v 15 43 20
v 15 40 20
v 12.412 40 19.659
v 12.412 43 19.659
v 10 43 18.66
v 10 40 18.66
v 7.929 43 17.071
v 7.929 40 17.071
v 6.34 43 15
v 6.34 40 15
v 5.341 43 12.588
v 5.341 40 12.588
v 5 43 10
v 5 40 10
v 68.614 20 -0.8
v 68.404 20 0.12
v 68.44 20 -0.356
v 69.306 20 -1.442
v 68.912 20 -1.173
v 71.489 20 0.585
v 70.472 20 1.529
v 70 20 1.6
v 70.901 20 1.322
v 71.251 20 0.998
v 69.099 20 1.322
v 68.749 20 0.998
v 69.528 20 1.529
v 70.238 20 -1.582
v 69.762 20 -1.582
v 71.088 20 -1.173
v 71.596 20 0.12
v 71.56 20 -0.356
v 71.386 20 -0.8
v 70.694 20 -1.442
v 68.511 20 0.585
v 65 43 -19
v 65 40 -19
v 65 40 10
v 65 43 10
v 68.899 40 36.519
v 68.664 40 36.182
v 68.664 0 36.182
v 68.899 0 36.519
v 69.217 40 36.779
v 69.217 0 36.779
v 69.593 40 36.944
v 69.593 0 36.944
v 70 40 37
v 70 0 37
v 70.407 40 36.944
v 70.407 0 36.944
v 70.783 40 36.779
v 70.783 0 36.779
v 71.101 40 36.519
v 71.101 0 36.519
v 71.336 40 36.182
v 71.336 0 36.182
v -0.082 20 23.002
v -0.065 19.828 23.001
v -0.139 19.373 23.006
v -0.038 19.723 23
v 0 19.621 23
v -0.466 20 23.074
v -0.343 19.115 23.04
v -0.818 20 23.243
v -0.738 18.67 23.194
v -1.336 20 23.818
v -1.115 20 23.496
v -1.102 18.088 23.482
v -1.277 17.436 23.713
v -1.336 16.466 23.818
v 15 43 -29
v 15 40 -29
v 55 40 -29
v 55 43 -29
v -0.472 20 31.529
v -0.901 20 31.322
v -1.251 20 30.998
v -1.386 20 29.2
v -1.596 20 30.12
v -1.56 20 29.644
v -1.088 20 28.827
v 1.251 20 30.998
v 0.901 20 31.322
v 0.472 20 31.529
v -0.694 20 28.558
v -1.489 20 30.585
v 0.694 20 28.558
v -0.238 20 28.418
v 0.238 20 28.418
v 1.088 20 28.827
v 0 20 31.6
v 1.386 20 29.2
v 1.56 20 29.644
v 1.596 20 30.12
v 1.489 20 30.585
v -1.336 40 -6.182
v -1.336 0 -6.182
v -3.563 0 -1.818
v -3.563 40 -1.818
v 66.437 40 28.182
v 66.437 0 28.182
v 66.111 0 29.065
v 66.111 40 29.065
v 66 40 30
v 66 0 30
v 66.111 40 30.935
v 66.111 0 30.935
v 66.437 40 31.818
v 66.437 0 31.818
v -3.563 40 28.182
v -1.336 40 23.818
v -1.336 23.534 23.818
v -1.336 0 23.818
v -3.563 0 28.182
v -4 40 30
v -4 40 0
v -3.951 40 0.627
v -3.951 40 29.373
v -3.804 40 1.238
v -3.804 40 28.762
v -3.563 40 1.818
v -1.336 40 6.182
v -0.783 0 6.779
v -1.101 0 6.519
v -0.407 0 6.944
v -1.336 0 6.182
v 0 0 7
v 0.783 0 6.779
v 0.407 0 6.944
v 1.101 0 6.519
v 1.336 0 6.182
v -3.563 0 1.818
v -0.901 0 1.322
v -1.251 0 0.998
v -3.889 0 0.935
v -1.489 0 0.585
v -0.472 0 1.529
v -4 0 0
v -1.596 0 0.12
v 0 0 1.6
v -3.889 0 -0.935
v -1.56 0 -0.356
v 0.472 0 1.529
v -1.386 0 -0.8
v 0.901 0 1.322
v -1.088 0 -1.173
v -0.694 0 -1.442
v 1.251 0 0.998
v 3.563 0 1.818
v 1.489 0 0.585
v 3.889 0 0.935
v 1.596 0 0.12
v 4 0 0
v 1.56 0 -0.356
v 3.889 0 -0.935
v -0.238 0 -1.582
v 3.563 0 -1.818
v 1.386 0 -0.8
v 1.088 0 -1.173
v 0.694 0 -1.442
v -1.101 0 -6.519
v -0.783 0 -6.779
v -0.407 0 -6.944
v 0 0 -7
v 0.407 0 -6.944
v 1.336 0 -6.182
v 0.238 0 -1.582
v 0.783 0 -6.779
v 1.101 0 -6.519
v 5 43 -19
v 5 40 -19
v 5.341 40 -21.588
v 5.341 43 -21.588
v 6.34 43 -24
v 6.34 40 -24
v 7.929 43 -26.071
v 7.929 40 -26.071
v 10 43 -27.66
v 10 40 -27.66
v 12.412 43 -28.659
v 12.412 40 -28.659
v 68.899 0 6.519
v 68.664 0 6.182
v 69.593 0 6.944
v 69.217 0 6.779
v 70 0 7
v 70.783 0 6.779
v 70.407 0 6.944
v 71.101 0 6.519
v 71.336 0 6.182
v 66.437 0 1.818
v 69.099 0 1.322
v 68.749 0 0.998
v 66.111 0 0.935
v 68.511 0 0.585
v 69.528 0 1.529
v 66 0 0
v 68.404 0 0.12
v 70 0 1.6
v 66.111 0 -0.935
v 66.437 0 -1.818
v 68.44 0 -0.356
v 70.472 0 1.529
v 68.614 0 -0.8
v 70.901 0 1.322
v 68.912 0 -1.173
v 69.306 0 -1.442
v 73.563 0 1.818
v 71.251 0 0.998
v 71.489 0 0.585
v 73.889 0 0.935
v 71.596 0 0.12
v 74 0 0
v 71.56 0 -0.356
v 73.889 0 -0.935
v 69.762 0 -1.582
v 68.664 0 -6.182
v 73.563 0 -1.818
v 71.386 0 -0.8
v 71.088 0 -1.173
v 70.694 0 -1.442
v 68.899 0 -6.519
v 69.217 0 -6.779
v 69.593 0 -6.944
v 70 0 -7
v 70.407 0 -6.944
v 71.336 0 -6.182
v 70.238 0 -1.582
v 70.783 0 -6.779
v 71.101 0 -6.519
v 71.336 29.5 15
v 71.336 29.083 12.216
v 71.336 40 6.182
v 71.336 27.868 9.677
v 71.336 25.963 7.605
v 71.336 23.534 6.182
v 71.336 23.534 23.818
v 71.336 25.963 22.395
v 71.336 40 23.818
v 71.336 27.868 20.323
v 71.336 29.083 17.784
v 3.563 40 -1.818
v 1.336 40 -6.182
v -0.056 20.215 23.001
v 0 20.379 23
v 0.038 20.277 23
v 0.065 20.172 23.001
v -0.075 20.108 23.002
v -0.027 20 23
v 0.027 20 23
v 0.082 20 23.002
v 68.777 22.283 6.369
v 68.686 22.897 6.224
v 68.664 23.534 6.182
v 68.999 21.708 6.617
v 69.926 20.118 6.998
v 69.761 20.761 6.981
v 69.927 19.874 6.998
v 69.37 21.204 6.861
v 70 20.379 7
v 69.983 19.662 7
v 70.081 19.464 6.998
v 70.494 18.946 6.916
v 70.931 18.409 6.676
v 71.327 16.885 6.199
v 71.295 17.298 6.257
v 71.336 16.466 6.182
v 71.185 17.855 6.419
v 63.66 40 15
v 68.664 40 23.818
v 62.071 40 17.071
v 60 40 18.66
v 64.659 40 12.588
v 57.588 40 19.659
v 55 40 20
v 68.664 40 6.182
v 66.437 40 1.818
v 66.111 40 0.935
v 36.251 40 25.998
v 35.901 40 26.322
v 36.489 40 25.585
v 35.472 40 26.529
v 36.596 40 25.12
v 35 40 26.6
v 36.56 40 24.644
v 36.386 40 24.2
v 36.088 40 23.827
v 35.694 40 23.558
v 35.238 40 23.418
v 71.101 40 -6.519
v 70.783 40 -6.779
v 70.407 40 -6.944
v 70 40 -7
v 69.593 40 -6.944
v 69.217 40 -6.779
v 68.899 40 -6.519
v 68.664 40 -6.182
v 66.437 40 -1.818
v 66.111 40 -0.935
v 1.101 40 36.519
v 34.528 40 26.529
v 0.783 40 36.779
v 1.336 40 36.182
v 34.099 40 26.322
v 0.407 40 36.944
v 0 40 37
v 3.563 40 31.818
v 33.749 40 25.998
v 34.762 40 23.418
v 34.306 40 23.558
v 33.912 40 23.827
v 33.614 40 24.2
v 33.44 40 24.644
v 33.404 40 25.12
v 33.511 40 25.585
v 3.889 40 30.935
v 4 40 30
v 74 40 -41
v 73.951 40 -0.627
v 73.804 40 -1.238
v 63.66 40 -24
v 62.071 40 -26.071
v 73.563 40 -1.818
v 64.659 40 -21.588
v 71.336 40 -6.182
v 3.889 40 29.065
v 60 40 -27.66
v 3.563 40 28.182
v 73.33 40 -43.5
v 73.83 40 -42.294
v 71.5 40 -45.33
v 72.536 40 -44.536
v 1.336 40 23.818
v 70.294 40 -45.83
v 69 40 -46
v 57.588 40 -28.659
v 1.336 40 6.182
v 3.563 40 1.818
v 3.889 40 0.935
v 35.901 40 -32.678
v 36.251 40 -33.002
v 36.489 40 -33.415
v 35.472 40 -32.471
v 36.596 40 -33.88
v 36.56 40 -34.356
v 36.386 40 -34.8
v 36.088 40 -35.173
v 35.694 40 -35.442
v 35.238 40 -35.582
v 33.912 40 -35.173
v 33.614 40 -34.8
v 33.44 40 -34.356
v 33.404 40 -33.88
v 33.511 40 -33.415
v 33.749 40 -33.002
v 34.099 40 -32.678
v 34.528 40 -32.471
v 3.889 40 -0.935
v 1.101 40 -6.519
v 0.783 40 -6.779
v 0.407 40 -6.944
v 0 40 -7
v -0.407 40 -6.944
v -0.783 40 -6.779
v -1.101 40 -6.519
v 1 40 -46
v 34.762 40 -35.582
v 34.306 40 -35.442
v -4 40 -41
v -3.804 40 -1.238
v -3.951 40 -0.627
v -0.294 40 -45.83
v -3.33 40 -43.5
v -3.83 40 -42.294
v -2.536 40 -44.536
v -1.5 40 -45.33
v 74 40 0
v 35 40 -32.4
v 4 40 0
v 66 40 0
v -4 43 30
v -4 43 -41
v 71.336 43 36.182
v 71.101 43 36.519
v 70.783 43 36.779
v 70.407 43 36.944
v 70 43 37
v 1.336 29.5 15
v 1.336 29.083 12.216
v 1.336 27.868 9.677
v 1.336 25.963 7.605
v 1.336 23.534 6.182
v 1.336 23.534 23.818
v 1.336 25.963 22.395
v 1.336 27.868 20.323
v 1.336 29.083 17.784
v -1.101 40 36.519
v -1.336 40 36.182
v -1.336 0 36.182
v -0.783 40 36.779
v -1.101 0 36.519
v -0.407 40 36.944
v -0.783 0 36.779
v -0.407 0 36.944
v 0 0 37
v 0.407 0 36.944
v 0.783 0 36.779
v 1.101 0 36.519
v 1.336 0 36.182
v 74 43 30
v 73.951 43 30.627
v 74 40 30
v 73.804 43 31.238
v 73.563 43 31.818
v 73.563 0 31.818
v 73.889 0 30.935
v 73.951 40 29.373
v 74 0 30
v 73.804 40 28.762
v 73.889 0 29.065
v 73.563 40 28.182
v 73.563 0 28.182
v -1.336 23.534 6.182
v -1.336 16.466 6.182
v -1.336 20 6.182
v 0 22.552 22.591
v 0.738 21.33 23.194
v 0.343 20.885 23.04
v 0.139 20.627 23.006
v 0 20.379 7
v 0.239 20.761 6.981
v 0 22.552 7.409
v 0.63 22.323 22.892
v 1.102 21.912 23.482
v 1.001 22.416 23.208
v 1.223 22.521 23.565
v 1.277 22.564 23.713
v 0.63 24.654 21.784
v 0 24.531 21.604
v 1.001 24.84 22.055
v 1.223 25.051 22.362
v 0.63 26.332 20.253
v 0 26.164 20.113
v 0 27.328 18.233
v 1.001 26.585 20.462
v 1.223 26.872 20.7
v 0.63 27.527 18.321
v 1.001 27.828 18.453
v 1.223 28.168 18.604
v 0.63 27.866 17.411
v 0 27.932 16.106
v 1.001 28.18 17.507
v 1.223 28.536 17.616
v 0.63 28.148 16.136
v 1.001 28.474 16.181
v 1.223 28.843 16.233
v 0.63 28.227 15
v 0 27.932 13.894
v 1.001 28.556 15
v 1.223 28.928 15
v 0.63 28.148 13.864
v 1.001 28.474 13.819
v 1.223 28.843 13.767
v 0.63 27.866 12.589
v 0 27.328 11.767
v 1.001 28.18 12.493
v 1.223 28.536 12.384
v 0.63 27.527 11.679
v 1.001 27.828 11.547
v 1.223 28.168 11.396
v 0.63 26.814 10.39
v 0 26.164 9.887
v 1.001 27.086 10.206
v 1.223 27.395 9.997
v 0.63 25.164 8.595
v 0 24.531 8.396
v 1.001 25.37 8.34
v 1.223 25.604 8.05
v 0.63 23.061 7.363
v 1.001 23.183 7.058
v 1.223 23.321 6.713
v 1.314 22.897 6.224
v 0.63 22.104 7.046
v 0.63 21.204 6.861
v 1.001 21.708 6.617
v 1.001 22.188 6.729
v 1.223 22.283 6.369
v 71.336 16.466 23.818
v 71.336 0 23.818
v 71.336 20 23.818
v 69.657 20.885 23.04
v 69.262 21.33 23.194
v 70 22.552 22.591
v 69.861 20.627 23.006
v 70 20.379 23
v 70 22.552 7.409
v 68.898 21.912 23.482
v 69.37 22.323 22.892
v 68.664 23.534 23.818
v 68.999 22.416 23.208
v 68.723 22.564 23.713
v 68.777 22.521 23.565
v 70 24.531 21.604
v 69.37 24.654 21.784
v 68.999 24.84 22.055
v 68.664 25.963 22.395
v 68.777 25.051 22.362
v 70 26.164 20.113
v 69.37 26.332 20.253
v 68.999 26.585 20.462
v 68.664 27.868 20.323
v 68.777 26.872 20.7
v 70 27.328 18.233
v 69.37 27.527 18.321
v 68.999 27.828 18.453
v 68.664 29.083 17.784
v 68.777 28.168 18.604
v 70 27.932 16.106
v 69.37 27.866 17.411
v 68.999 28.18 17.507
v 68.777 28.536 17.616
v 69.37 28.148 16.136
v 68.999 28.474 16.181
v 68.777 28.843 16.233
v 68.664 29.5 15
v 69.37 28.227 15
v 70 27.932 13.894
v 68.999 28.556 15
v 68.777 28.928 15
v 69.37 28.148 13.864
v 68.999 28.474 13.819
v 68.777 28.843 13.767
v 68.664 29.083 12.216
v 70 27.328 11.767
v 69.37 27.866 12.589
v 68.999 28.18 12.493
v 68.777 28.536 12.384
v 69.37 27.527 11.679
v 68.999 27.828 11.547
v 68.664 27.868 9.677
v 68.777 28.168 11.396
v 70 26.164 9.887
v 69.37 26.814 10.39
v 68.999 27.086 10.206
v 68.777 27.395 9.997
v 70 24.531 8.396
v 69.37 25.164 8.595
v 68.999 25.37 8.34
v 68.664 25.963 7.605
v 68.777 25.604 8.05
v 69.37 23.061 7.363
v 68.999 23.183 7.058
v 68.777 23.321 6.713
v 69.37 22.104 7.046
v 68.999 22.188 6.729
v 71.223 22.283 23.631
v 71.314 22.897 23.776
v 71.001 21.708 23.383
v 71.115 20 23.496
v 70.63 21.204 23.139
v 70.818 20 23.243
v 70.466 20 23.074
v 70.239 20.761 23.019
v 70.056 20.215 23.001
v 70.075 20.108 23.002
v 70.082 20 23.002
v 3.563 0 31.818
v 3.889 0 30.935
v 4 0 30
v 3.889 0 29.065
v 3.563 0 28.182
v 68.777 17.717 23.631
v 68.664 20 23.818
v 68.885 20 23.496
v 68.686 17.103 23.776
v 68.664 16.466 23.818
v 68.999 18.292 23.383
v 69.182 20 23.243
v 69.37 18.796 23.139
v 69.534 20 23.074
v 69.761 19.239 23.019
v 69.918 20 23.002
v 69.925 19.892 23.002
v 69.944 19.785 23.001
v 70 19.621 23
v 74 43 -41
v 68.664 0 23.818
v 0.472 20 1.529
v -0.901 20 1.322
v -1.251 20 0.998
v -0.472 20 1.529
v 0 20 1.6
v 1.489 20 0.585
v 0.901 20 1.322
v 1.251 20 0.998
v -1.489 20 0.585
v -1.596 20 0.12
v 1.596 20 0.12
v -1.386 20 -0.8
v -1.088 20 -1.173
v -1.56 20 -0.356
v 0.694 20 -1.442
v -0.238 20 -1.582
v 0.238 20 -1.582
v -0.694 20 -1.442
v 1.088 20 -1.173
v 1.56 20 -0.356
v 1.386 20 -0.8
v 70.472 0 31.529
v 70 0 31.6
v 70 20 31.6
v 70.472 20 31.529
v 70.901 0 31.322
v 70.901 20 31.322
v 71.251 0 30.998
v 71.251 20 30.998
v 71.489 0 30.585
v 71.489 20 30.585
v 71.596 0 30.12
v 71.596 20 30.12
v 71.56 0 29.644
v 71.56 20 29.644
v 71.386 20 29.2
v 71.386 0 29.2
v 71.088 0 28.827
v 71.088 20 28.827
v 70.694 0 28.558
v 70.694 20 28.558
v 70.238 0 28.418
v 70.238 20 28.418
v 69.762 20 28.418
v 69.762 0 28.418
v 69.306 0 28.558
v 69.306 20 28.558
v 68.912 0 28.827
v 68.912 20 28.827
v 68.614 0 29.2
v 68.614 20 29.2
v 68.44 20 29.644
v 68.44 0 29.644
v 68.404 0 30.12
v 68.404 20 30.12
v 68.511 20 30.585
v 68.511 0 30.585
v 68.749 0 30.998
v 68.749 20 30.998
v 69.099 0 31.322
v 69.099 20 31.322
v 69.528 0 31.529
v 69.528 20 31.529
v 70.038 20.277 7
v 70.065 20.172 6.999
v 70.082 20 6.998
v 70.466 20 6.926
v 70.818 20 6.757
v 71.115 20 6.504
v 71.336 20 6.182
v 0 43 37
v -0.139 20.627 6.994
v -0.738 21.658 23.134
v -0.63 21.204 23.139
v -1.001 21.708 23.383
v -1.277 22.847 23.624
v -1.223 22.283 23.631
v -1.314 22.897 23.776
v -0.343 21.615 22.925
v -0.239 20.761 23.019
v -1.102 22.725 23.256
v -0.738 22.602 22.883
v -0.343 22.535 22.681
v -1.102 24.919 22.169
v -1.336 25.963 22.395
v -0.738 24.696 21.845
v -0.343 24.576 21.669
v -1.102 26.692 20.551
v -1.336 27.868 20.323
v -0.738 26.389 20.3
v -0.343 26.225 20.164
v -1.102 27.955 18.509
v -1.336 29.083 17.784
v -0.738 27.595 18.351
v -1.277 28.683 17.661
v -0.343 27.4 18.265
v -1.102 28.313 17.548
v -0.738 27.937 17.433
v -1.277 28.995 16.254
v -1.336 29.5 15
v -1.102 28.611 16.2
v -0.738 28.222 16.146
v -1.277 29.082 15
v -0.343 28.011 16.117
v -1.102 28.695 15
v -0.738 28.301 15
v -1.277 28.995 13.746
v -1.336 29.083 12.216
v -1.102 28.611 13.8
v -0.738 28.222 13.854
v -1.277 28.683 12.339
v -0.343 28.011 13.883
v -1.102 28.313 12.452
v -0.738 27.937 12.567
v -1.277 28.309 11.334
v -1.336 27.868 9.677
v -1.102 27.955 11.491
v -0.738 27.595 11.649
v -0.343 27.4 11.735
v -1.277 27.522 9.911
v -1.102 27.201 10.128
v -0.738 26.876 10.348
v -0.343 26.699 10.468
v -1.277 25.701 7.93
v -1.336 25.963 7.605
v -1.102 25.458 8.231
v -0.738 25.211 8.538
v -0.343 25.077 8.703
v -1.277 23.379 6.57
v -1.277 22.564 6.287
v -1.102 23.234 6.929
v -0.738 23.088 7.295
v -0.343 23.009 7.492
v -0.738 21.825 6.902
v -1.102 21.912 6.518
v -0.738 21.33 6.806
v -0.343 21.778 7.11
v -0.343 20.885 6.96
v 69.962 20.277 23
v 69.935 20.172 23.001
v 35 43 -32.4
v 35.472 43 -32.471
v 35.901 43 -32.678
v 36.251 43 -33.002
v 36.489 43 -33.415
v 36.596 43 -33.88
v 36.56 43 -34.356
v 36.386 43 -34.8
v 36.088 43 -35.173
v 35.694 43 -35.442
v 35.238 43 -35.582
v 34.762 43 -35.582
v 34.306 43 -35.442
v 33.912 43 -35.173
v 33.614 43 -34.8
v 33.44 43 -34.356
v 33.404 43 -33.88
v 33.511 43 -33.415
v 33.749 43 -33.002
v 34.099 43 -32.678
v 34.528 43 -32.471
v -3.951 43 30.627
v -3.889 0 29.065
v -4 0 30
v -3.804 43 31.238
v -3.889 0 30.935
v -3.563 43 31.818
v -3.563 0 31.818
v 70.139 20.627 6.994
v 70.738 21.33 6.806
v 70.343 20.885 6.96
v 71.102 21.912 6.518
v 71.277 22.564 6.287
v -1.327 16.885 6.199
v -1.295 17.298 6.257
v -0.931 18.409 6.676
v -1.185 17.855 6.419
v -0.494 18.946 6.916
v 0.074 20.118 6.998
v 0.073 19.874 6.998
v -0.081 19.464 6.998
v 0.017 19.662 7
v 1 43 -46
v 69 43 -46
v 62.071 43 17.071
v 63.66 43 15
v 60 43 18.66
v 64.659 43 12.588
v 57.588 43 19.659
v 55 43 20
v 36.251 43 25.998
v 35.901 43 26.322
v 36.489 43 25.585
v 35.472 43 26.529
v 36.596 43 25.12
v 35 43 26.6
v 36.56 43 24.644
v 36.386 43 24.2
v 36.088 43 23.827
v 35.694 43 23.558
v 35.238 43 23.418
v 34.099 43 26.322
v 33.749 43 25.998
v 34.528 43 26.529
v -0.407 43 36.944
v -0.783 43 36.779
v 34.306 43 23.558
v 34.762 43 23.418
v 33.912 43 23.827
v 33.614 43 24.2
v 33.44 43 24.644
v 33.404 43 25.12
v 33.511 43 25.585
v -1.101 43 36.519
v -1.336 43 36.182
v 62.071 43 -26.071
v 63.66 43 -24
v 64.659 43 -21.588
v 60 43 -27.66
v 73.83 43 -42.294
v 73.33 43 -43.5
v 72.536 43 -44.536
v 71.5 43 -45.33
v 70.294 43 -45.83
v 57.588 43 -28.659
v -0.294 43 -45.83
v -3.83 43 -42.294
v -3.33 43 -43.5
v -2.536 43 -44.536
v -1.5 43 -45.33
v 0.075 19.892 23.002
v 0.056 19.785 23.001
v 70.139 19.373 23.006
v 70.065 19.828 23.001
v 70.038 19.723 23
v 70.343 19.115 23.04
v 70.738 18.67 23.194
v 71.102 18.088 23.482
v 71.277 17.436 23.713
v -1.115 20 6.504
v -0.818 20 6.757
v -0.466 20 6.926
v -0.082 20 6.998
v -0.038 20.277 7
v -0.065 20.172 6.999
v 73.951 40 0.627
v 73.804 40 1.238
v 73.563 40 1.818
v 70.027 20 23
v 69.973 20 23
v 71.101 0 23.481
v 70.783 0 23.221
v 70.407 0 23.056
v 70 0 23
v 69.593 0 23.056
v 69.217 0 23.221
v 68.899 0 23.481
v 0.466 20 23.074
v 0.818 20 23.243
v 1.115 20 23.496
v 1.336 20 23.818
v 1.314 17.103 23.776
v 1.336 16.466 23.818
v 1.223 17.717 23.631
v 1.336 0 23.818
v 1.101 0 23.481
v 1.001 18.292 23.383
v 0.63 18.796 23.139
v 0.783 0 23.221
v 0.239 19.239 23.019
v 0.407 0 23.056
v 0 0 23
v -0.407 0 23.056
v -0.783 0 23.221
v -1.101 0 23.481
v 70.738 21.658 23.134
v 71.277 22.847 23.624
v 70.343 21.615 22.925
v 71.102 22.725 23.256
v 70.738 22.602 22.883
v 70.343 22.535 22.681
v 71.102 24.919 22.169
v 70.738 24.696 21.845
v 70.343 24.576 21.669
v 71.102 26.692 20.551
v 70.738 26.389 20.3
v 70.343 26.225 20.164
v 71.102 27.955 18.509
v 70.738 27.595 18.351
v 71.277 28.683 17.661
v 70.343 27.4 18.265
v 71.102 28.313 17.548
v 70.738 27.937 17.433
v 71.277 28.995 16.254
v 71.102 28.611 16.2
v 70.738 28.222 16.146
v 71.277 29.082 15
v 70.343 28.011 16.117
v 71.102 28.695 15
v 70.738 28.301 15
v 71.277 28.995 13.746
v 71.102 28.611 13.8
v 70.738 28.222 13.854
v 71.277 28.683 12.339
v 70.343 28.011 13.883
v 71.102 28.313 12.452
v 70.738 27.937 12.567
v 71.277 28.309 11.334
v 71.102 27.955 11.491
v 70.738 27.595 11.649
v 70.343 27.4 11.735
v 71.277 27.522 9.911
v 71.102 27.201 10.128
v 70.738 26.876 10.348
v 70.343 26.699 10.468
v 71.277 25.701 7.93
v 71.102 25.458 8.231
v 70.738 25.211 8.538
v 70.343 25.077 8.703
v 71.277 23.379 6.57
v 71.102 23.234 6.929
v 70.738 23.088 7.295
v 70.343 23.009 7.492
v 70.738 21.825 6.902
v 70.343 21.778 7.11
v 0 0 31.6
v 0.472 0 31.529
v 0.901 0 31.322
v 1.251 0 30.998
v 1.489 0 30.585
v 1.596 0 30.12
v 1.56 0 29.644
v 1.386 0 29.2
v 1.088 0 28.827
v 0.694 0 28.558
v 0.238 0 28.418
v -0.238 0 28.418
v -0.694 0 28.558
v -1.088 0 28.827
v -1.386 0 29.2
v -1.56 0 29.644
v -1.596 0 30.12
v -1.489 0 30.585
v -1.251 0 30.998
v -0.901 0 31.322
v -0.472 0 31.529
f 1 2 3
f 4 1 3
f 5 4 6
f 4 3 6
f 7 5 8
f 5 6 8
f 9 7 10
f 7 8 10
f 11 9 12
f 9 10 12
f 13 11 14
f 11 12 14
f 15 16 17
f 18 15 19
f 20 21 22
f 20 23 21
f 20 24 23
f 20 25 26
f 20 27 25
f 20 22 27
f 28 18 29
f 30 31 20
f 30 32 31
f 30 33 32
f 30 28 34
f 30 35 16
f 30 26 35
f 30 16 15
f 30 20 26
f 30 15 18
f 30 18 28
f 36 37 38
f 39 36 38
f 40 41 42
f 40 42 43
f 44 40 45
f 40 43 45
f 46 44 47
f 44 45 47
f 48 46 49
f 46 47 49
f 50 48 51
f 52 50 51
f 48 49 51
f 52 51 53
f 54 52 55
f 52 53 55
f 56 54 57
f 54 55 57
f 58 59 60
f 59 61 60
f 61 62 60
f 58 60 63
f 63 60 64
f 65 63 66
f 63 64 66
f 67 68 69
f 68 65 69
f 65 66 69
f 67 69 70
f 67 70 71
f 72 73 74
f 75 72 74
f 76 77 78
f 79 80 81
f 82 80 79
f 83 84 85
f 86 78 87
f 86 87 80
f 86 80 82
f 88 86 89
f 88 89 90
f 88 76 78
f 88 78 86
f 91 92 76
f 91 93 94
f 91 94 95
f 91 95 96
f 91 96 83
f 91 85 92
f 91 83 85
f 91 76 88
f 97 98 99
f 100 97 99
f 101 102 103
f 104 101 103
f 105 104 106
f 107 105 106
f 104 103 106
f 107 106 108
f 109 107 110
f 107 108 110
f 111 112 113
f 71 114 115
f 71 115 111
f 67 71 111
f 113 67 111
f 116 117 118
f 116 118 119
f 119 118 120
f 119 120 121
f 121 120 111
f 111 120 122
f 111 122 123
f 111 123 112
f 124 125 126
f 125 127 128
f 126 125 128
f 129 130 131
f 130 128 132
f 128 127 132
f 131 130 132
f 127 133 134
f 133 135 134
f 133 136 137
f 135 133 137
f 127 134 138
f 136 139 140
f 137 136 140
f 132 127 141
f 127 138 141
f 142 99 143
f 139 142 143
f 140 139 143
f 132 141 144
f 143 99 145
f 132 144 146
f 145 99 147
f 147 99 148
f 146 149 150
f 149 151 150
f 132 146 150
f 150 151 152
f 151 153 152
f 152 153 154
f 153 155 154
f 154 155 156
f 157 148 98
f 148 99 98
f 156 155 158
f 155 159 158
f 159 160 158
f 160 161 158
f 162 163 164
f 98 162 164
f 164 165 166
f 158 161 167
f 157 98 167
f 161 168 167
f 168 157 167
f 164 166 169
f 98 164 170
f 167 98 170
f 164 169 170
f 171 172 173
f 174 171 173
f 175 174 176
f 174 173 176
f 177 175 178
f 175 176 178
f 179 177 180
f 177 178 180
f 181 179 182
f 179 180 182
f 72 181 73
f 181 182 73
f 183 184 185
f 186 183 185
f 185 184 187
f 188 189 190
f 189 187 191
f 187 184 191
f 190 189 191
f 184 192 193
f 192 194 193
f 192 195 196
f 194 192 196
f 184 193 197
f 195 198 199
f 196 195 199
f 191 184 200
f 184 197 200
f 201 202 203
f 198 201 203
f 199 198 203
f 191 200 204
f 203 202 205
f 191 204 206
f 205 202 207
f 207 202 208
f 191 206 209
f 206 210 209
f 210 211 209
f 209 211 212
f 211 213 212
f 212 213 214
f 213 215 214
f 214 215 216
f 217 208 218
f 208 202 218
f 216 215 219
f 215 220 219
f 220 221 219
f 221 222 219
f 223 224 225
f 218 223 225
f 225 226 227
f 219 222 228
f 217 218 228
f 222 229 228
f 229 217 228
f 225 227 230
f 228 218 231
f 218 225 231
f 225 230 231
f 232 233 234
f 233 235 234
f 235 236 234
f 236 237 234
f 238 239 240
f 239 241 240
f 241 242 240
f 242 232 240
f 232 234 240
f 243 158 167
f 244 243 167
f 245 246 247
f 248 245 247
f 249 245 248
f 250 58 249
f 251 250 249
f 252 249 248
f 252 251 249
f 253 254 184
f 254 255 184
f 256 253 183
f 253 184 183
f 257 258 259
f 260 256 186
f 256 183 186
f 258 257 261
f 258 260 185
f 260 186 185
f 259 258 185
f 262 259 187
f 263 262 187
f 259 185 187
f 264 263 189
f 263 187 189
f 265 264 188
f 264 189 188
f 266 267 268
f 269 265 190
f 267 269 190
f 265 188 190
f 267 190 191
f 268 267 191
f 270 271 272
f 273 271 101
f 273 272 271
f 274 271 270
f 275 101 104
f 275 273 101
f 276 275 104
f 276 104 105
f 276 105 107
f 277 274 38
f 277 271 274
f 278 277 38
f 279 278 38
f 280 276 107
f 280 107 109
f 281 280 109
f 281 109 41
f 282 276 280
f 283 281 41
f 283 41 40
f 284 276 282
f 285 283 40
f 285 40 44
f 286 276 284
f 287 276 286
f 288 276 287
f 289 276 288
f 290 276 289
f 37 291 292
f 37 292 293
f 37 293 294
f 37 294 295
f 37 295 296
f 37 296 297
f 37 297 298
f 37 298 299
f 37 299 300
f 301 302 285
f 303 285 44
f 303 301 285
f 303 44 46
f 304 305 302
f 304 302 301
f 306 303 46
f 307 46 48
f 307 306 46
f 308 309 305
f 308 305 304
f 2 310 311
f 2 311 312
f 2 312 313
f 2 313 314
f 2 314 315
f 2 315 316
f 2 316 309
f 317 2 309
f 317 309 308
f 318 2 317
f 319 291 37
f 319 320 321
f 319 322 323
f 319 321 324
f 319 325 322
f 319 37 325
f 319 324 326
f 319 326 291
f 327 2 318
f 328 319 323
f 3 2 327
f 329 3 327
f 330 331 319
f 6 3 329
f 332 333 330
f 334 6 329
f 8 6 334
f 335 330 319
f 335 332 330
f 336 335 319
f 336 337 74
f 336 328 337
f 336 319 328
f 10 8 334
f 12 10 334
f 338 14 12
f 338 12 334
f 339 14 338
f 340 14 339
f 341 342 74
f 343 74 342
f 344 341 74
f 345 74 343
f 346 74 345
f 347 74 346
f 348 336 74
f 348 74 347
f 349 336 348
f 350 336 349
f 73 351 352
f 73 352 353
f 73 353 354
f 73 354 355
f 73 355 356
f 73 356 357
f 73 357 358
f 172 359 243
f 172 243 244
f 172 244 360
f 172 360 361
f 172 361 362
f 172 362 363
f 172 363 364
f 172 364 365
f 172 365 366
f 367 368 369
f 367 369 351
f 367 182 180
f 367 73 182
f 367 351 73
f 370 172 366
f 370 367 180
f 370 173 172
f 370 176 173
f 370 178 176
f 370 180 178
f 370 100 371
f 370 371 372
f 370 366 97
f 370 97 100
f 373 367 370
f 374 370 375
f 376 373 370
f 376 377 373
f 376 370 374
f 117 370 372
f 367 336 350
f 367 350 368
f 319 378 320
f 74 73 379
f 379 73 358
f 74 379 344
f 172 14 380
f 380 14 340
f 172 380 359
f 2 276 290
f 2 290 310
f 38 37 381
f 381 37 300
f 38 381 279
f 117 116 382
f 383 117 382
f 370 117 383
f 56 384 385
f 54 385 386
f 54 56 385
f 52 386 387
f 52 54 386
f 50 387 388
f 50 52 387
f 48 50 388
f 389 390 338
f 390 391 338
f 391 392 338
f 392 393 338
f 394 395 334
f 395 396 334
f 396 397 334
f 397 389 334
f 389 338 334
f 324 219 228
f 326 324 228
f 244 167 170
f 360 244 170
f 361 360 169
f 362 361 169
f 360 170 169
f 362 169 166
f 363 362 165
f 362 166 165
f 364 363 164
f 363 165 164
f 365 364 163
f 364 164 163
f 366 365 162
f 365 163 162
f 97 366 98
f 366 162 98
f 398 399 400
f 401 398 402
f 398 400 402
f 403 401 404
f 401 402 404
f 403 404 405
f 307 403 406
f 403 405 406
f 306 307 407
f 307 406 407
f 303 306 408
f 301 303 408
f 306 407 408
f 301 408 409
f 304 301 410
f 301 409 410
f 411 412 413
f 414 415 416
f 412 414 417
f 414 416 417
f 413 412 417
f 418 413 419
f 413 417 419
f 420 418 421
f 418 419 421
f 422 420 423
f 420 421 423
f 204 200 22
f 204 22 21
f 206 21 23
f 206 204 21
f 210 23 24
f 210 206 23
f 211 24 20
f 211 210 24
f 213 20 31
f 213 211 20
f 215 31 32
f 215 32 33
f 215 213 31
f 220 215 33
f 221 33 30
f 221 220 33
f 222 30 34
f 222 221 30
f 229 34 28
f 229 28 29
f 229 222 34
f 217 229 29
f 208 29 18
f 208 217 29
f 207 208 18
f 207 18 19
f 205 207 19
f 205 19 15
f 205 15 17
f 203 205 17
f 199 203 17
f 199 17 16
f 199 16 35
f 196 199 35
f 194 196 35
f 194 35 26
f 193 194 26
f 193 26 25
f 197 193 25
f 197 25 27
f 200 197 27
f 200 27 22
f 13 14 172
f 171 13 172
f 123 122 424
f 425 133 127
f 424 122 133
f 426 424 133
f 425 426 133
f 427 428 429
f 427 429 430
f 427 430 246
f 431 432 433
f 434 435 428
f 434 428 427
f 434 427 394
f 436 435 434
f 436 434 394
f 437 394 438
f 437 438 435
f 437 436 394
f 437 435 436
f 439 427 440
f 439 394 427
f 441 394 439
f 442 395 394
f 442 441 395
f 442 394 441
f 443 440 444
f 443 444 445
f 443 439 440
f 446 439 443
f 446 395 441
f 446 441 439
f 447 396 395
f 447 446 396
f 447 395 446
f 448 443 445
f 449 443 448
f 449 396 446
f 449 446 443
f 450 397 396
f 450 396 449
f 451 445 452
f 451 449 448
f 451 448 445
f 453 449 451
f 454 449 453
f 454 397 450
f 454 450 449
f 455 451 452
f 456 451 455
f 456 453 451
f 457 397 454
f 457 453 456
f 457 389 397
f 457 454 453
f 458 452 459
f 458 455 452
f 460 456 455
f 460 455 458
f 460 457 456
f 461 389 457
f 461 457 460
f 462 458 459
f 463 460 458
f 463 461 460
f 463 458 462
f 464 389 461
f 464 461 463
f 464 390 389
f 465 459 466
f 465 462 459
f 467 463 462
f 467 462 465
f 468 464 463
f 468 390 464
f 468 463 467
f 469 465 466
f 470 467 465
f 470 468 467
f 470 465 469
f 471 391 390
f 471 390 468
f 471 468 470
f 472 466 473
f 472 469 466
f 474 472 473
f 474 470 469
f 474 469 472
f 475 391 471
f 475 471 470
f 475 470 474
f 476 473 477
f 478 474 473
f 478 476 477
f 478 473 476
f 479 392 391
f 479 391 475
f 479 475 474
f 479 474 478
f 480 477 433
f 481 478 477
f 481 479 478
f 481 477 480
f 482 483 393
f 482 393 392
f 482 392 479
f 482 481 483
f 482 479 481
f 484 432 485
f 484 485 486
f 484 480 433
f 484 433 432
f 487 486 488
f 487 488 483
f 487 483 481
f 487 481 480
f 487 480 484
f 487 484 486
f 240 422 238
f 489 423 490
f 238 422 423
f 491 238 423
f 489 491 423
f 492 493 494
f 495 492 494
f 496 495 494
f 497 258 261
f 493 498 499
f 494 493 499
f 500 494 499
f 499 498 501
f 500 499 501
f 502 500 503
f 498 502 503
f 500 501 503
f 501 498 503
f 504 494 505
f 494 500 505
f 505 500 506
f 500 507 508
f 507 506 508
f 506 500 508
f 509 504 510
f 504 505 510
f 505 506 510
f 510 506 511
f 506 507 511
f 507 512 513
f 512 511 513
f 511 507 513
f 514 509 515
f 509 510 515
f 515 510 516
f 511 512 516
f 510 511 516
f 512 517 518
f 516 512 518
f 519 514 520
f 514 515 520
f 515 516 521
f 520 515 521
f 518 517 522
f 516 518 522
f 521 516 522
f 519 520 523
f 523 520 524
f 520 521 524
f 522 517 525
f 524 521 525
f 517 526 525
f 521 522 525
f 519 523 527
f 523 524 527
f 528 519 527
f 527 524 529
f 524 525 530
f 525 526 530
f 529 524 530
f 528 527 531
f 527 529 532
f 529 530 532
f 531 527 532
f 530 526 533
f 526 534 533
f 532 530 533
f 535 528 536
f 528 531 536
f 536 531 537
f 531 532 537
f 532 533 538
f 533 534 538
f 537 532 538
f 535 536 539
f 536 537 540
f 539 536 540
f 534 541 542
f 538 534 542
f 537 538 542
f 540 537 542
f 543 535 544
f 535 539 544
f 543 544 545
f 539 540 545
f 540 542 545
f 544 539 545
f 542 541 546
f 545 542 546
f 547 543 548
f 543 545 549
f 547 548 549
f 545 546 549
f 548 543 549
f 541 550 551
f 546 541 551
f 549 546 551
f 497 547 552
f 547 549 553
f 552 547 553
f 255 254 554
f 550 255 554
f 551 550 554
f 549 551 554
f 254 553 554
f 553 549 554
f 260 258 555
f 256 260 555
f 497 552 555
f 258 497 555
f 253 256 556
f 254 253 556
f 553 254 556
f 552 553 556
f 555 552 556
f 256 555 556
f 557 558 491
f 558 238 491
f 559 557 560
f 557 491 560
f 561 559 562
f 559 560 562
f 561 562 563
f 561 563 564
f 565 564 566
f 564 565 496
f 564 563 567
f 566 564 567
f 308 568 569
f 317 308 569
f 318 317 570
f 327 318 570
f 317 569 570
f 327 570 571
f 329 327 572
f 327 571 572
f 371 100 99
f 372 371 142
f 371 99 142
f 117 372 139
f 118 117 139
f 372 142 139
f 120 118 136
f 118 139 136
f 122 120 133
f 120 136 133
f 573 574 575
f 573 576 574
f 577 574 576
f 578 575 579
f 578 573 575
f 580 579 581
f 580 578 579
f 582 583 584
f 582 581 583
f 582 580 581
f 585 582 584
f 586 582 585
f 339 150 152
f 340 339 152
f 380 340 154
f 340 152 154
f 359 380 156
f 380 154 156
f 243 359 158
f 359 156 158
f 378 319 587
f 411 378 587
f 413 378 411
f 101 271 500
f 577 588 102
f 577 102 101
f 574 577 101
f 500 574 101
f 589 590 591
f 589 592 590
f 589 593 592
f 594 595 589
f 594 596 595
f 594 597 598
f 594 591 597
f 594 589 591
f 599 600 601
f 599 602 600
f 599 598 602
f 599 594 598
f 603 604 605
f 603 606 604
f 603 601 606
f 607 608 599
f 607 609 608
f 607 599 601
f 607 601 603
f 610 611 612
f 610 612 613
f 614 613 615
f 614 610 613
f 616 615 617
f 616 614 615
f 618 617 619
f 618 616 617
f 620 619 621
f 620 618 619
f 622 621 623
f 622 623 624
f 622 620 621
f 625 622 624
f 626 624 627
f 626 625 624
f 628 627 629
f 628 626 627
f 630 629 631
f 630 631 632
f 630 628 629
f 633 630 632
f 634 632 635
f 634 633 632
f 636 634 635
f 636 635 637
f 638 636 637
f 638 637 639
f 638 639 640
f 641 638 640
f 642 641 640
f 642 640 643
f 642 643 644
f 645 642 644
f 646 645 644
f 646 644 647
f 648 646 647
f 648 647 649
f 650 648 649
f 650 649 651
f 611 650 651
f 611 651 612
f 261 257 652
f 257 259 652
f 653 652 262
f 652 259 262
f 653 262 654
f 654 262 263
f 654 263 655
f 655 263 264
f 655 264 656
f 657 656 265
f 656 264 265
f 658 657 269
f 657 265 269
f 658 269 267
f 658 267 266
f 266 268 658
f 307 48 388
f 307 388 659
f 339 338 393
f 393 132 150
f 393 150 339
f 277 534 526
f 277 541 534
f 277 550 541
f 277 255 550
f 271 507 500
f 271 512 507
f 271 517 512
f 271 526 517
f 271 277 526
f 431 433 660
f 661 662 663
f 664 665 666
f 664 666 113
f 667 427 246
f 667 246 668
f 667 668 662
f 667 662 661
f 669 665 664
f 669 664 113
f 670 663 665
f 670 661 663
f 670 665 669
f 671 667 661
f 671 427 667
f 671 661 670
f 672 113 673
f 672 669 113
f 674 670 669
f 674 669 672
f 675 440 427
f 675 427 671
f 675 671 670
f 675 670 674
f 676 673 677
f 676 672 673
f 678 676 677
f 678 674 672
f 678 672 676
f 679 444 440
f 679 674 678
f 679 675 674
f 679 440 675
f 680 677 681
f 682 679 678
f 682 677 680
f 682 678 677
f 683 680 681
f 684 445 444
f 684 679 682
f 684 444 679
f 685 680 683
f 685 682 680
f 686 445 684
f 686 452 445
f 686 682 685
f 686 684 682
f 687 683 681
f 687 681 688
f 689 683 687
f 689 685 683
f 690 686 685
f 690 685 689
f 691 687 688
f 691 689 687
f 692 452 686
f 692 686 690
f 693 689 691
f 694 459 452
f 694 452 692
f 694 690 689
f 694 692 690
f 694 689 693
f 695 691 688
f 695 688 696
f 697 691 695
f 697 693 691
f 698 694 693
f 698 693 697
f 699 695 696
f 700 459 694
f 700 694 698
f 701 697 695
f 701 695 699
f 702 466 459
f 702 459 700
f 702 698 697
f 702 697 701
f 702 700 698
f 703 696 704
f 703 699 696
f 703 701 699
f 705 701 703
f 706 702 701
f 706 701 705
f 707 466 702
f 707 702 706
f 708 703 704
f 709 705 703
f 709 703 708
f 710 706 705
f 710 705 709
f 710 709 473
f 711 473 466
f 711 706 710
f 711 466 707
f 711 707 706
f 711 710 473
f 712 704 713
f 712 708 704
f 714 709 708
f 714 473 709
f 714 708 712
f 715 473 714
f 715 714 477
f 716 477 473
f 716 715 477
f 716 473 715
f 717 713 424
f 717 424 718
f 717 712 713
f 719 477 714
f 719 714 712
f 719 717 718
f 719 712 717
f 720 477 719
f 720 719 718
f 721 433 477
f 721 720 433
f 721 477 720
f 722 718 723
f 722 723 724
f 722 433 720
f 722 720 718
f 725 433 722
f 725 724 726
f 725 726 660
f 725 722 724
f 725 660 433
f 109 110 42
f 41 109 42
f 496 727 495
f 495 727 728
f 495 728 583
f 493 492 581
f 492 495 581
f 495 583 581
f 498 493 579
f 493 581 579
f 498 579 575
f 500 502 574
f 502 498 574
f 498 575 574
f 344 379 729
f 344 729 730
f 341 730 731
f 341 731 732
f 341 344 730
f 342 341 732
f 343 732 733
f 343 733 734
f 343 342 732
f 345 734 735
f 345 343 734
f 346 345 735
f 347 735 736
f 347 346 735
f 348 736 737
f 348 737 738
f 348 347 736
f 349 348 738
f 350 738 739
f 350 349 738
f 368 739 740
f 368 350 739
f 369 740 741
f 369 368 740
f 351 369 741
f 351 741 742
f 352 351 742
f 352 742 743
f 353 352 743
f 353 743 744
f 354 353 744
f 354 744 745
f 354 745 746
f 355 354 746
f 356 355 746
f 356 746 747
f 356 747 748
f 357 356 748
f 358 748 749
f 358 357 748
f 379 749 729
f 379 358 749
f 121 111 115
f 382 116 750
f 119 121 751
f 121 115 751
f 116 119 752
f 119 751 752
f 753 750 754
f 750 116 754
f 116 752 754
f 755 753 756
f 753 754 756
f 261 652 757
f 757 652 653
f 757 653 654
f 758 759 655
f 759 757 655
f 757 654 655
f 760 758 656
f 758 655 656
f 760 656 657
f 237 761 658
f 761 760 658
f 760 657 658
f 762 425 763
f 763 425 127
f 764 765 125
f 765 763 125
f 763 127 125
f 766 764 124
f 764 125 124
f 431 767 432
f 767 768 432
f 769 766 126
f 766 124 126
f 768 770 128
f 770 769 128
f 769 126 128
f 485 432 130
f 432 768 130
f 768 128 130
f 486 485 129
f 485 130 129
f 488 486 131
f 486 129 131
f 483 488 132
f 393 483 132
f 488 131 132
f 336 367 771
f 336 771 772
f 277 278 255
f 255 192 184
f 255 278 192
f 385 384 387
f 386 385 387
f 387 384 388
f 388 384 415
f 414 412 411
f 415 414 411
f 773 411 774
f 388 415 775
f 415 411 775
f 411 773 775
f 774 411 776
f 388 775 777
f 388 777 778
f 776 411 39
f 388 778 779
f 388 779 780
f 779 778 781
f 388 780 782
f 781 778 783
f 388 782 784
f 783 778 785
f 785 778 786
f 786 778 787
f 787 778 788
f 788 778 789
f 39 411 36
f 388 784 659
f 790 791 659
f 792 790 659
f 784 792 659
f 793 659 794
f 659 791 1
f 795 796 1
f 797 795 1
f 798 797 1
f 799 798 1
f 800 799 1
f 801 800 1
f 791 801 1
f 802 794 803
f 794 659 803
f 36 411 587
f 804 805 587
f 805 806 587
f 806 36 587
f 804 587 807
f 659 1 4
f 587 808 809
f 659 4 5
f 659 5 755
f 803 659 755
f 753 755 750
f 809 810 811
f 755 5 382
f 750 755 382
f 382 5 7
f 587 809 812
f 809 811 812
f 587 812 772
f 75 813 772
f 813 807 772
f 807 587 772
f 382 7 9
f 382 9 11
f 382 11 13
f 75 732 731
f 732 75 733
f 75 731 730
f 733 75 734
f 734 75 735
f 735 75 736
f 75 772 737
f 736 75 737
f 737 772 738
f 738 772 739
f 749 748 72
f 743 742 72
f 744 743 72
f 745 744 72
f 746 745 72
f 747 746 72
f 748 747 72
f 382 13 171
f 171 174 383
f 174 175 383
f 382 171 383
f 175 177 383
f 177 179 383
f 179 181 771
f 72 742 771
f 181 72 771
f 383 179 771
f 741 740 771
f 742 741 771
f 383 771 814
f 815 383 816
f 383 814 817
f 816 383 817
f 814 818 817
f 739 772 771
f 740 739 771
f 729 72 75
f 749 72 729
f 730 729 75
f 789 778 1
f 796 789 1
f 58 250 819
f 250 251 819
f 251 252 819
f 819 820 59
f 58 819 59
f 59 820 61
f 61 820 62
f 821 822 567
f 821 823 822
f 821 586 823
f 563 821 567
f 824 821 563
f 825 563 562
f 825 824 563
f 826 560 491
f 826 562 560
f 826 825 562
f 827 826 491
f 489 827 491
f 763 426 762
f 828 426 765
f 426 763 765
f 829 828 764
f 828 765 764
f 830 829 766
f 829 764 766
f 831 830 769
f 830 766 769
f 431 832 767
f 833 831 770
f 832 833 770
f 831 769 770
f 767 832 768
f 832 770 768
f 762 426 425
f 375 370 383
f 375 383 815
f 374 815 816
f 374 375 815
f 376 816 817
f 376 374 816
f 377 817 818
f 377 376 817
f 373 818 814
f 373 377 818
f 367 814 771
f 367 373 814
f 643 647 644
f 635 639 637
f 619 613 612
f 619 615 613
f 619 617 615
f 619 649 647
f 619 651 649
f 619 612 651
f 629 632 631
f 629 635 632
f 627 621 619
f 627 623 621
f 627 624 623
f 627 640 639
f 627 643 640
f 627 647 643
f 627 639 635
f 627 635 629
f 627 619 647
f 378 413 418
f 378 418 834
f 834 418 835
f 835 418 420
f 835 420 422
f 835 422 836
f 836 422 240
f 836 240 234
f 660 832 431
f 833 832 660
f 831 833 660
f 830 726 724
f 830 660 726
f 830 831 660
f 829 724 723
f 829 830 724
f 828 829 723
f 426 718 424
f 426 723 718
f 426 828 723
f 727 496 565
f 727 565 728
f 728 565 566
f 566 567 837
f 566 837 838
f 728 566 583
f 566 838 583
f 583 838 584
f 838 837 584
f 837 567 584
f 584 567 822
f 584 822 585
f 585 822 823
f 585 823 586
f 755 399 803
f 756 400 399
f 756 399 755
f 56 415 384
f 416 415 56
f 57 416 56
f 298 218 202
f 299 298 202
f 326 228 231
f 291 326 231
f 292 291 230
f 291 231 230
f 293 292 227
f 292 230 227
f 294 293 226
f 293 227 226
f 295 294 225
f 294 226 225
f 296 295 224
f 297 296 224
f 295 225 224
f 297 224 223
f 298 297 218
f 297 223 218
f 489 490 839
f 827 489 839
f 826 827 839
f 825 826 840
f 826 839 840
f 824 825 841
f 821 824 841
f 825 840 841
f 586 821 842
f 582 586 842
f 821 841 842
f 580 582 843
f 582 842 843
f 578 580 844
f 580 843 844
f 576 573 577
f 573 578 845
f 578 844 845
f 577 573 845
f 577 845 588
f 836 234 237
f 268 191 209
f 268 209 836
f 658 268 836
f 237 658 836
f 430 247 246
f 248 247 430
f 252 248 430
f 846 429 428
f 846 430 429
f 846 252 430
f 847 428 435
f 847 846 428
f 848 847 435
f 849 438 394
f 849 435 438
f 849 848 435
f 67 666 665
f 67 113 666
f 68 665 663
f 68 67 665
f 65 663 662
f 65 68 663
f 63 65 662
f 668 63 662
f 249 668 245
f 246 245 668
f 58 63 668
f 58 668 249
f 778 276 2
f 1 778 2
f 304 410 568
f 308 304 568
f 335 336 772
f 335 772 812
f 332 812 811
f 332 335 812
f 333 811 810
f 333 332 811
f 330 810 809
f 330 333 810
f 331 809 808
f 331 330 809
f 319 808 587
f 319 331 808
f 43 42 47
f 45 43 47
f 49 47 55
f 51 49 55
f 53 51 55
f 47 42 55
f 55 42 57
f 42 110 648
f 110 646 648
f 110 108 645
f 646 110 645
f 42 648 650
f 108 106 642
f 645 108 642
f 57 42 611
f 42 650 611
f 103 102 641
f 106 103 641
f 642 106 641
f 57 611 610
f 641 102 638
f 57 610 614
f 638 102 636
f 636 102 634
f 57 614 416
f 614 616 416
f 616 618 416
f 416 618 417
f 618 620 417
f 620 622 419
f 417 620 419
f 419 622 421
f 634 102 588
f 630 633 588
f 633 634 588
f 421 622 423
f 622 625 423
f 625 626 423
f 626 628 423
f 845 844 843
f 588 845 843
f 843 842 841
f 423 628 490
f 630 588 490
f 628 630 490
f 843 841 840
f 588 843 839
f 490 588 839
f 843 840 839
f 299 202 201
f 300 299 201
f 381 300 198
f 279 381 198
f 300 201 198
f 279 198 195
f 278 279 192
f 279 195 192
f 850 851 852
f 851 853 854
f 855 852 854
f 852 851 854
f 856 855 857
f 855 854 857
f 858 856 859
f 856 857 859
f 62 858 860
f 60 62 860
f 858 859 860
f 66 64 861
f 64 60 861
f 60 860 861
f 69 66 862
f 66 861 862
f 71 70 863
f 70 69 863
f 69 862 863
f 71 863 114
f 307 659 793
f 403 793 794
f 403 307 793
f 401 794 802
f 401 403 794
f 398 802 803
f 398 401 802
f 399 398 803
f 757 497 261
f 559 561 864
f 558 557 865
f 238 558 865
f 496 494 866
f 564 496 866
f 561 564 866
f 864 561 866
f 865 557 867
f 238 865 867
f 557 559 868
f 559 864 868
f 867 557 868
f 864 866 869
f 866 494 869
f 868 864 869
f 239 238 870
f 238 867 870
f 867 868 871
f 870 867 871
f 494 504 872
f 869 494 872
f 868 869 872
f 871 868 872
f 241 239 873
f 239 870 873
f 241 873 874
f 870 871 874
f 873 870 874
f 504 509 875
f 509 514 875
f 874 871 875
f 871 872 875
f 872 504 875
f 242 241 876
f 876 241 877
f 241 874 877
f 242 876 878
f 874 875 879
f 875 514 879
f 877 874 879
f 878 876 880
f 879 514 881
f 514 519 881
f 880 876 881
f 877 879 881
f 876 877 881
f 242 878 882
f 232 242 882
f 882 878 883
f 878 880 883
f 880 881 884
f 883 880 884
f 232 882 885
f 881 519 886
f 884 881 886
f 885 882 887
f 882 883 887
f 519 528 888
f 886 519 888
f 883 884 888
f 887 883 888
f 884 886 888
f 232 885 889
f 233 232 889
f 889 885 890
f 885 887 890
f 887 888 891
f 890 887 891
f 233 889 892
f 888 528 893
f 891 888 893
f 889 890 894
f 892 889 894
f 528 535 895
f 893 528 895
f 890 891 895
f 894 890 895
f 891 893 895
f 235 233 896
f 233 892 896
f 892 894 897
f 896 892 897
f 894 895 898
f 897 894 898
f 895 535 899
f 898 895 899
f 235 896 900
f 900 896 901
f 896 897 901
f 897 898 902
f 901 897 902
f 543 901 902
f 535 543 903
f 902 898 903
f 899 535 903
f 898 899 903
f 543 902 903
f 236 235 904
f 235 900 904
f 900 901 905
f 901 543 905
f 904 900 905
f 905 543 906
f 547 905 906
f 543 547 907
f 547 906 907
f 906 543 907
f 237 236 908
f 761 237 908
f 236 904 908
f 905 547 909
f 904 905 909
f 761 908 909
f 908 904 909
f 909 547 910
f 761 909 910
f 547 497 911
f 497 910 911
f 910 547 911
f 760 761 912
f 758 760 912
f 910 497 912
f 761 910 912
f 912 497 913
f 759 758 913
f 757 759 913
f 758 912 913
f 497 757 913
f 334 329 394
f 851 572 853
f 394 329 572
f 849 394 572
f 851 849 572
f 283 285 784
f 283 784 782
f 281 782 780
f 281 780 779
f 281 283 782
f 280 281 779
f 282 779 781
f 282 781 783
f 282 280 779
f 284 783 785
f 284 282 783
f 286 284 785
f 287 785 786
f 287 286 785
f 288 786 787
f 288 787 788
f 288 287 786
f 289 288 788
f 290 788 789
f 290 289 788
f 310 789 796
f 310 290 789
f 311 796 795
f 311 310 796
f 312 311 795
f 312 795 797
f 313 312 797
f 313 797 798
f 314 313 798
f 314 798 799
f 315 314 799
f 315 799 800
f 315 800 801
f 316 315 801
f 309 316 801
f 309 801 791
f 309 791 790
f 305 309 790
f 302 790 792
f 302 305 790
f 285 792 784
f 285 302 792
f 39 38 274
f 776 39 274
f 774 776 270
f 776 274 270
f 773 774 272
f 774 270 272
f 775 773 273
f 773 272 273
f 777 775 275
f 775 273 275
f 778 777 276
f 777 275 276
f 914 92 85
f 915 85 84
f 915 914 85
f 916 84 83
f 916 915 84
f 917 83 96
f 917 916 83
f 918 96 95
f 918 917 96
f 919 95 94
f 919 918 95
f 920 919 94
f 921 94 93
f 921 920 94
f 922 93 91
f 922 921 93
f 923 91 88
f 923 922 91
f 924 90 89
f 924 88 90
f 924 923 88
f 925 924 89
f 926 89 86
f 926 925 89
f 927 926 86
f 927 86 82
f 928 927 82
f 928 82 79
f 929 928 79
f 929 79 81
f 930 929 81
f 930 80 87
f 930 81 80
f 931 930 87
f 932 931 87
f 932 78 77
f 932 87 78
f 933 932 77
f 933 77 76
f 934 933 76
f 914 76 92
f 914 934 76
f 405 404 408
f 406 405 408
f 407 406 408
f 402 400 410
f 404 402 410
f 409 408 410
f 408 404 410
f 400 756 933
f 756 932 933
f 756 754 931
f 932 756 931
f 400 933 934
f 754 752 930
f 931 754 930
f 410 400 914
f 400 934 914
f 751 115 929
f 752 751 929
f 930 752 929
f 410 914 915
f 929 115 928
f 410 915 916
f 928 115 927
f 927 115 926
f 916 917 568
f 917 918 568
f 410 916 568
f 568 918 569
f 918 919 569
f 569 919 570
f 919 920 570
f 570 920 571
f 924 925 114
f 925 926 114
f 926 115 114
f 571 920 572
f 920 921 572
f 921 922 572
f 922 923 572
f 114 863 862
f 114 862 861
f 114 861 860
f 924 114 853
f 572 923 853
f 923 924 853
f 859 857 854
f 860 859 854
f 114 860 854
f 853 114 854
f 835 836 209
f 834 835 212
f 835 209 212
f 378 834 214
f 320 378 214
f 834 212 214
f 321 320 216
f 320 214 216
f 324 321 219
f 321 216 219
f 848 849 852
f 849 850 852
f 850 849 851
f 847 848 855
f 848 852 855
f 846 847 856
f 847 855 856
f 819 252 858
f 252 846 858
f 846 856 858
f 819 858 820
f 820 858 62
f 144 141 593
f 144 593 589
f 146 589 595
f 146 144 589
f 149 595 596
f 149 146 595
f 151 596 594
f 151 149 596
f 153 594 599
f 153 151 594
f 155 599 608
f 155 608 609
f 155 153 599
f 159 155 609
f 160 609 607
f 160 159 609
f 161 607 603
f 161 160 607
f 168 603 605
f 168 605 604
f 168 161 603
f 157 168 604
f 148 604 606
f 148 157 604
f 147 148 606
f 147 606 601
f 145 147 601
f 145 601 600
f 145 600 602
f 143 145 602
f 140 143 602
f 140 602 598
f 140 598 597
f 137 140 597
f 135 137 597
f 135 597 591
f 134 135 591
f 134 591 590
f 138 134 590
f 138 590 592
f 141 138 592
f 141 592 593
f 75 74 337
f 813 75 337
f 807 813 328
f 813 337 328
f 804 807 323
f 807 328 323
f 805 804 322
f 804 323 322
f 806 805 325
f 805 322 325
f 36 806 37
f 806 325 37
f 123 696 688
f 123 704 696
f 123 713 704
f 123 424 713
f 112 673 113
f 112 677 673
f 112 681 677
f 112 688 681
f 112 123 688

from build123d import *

# Parameters (mm, degrees)
SKETCH1_R             = 1.6
BOSS_EXTRUDE1_DEPTH   = 40
BOSS_EXTRUDE1_2_DEPTH = 40
BOSS_EXTRUDE1_3_DEPTH = 40
BOSS_EXTRUDE1_4_DEPTH = 40
SKETCH2_R             = 1.6
BOSS_EXTRUDE2_DEPTH   = 3
SKETCH4_W             = 2.672170628
SKETCH4_H             = 17.636363636
BOSS_EXTRUDE3_DEPTH   = 20
SKETCH6_R             = 8
CUT_EXTRUDE2_DEPTH    = 99.18617902
FILLET1_R             = 1.5
BOSS_EXTRUDE4_START   = 20
SKETCH7_R             = 1.6
BOSS_EXTRUDE4_DEPTH   = 20


# Read off the part's stored shape, not the designer's step: Mirror2
with BuildPart() as part:
    # Sketch1 → Boss-Extrude1 (new body)
    with BuildSketch(Plane(origin=(0, 0, 0), x_dir=(1, 0, 0), z_dir=(0, 1, 0))):
        with BuildLine():
            Line((-1.336085314, 6.181818182), (-3.562894171, 1.818181818))
            ThreePointArc((-3.562894171, 1.818181818), (-4, 0), (-3.562894171, -1.818181818))
            Line((-3.562894171, -1.818181818), (-1.336085314, -6.181818182))
            ThreePointArc((-1.336085314, -6.181818182), (0, -7), (1.336085314, -6.181818182))
            Line((1.336085314, -6.181818182), (3.562894171, -1.818181818))
            ThreePointArc((3.562894171, -1.818181818), (4, 0), (3.562894171, 1.818181818))
            Line((3.562894171, 1.818181818), (1.336085314, 6.181818182))
            ThreePointArc((1.336085314, 6.181818182), (0, 7), (-1.336085314, 6.181818182))
        make_face()
        with Locations(Location((0, 0, 0), (0, 0, 270))):
            Circle(SKETCH1_R, mode=Mode.SUBTRACT)
    extrude(amount=BOSS_EXTRUDE1_DEPTH)



with BuildPart() as body_2:
    # Sketch1 → Boss-Extrude1 2 (new body)
    with BuildSketch(Plane(origin=(0, 0, 0), x_dir=(1, 0, 0), z_dir=(0, 1, 0))):
        with BuildLine():
            Line((68.663914686, 6.181818182), (66.437105829, 1.818181818))
            ThreePointArc((66.437105829, 1.818181818), (66, 0), (66.437105829, -1.818181818))
            Line((66.437105829, -1.818181818), (68.663914686, -6.181818182))
            ThreePointArc((68.663914686, -6.181818182), (70, -7), (71.336085314, -6.181818182))
            Line((71.336085314, -6.181818182), (73.562894171, -1.818181818))
            ThreePointArc((73.562894171, -1.818181818), (74, 0), (73.562894171, 1.818181818))
            Line((73.562894171, 1.818181818), (71.336085314, 6.181818182))
            ThreePointArc((71.336085314, 6.181818182), (70, 7), (68.663914686, 6.181818182))
        make_face()
        with Locations(Location((70, 0, 0), (0, 0, 270))):
            Circle(SKETCH1_R, mode=Mode.SUBTRACT)
    extrude(amount=BOSS_EXTRUDE1_2_DEPTH)


with BuildPart() as body_3:
    # Sketch1 → Boss-Extrude1 3 (new body)
    with BuildSketch(Plane(origin=(0, 0, 0), x_dir=(1, 0, 0), z_dir=(0, 1, 0))):
        with BuildLine():
            Line((68.663914686, -23.818181818), (66.437105829, -28.181818182))
            ThreePointArc((66.437105829, -28.181818182), (66, -30), (66.437105829, -31.818181818))
            Line((66.437105829, -31.818181818), (68.663914686, -36.181818182))
            ThreePointArc((68.663914686, -36.181818182), (70, -37), (71.336085314, -36.181818182))
            Line((71.336085314, -36.181818182), (73.562894171, -31.818181818))
            ThreePointArc((73.562894171, -31.818181818), (74, -30), (73.562894171, -28.181818182))
            Line((73.562894171, -28.181818182), (71.336085314, -23.818181818))
            ThreePointArc((71.336085314, -23.818181818), (70, -23), (68.663914686, -23.818181818))
        make_face()
        with Locations(Location((70, -30, 0), (0, 0, 270))):
            Circle(SKETCH1_R, mode=Mode.SUBTRACT)
    extrude(amount=BOSS_EXTRUDE1_3_DEPTH)


with BuildPart() as body_4:
    # Sketch1 → Boss-Extrude1 4 (new body)
    with BuildSketch(Plane(origin=(0, 0, 0), x_dir=(1, 0, 0), z_dir=(0, 1, 0))):
        with BuildLine():
            Line((-1.336085314, -23.818181818), (-3.562894171, -28.181818182))
            ThreePointArc((-3.562894171, -28.181818182), (-4, -30), (-3.562894171, -31.818181818))
            Line((-3.562894171, -31.818181818), (-1.336085314, -36.181818182))
            ThreePointArc((-1.336085314, -36.181818182), (0, -37), (1.336085314, -36.181818182))
            Line((1.336085314, -36.181818182), (3.562894171, -31.818181818))
            ThreePointArc((3.562894171, -31.818181818), (4, -30), (3.562894171, -28.181818182))
            Line((3.562894171, -28.181818182), (1.336085314, -23.818181818))
            ThreePointArc((1.336085314, -23.818181818), (0, -23), (-1.336085314, -23.818181818))
        make_face()
        with Locations(Location((0, -30, 0), (0, 0, 270))):
            Circle(SKETCH1_R, mode=Mode.SUBTRACT)
    extrude(amount=BOSS_EXTRUDE1_4_DEPTH)


with BuildPart() as part_1:
    add(part.part)

    add(body_2.part)  # Boss-Extrude2 merges body 2

    add(body_3.part)  # Boss-Extrude2 merges body 3

    add(body_4.part)  # Boss-Extrude2 merges body 4
    # Sketch2 → Boss-Extrude2 (add)
    with BuildSketch(Plane(origin=(0, 40, 0), x_dir=(1, 0, 0), z_dir=(0, 1, 0))):
        with BuildLine():
            Line((1, 46), (69, 46))
            ThreePointArc((69, 46), (72.535533906, 44.535533906), (74, 41))
            Line((74, 41), (74, -30))
            ThreePointArc((74, -30), (73.889188648, -30.934992865), (73.562894171, -31.818181818))
            Line((73.562894171, -31.818181818), (71.336085314, -36.181818182))
            ThreePointArc((71.336085314, -36.181818182), (70.783349452, -36.779204298), (70, -37))
            Line((70, -37), (0, -37))
            ThreePointArc((0, -37), (-0.783349452, -36.779204298), (-1.336085314, -36.181818182))
            Line((-1.336085314, -36.181818182), (-3.562894171, -31.818181818))
            ThreePointArc((-3.562894171, -31.818181818), (-3.889188648, -30.934992865), (-4, -30))
            Line((-4, -30), (-4, 41))
            ThreePointArc((-4, 41), (-2.535533906, 44.535533906), (1, 46))
        make_face()
        with Locations(Location((35, -25, 0), (0, 0, 270))):
            Circle(SKETCH2_R, mode=Mode.SUBTRACT)
        with Locations(Location((35, 34, 0), (0, 0, 270))):
            Circle(SKETCH2_R, mode=Mode.SUBTRACT)
        with BuildLine():
            Line((15, 29), (55, 29))
            ThreePointArc((55, 29), (62.071067812, 26.071067812), (65, 19))
            Line((65, 19), (65, -10))
            ThreePointArc((65, -10), (62.071067812, -17.071067812), (55, -20))
            Line((55, -20), (15, -20))
            ThreePointArc((15, -20), (7.928932188, -17.071067812), (5, -10))
            Line((5, -10), (5, 19))
            ThreePointArc((5, 19), (7.928932188, 26.071067812), (15, 29))
        make_face(mode=Mode.SUBTRACT)
    extrude(amount=BOSS_EXTRUDE2_DEPTH)

    # Sketch4 → Boss-Extrude3 (add)
    with BuildSketch(Plane.XZ.offset(-40)):
        with Locations((0, 15)):
            Rectangle(SKETCH4_W, SKETCH4_H)
    extrude(amount=BOSS_EXTRUDE3_DEPTH)

    # Sketch6 → Cut-Extrude2 (cut, through all)
    with BuildSketch(Plane.ZY.offset(1.336085314)):
        with Locations((15, 20)):
            Circle(SKETCH6_R)
    extrude(amount=-CUT_EXTRUDE2_DEPTH, mode=Mode.SUBTRACT)

    # Fillet1
    # the kernel refuses this fillet: 1.5 mm, written as the material it takes off along each edge
    with BuildSketch(Plane(origin=(1.336085314, 20, 15), x_dir=(0, -0.45244386791178526, 0.8917928831231068), z_dir=(0, -0.8917928831231068, -0.45244386791178526))) as fillet1_piece_1_section:
        with BuildLine():
            CenterArc((8 + FILLET1_R, FILLET1_R), FILLET1_R, 180, 90)
            Line((8, FILLET1_R), (8, 0))
            Line((8, 0), (8 + FILLET1_R, 0))
        make_face()
    fillet1_piece_1 = revolve(axis=Axis((1.336085314, 20, 15), (-1, 0, 0)), revolution_arc=233.801176838, mode=Mode.PRIVATE)
    fillet1_piece_1 = fillet1_piece_1 - Plane(origin=(0, 21.66747918, 5.5), x_dir=(-0.8907235428302468, 0, 0.45454545454545436), z_dir=(0, -1, 0)) * Cylinder(1.5, 38, mode=Mode.PRIVATE)
    fillet1_piece_1 = fillet1_piece_1 - Plane(origin=(0, 21.66747918, 24.5), x_dir=(0.8907235428302462, 0, -0.4545454545454553), z_dir=(0, -1, 0)) * Cylinder(1.5, 38, mode=Mode.PRIVATE)
    add(fillet1_piece_1, mode=Mode.SUBTRACT)
    with BuildSketch(Plane(origin=(-1.336085314, 20, 15), x_dir=(0, -0.45244386791178526, 0.8917928831231068), z_dir=(0, -0.8917928831231068, -0.45244386791178526))) as fillet1_piece_2_section:
        with BuildLine():
            CenterArc((8 + FILLET1_R, -FILLET1_R), FILLET1_R, 90, 90)
            Line((8, -FILLET1_R), (8, 0))
            Line((8, 0), (8 + FILLET1_R, 0))
        make_face()
    fillet1_piece_2 = revolve(axis=Axis((-1.336085314, 20, 15), (-1, 0, 0)), revolution_arc=233.801176838, mode=Mode.PRIVATE)
    fillet1_piece_2 = fillet1_piece_2 - Plane(origin=(0, 21.66746874, 5.5), x_dir=(-0.8907235428302468, 0, 0.45454545454545436), z_dir=(0, -1, 0)) * Cylinder(1.5, 39, mode=Mode.PRIVATE)
    fillet1_piece_2 = fillet1_piece_2 - Plane(origin=(0, 21.66746874, 24.5), x_dir=(0.8907235428302462, 0, -0.4545454545454553), z_dir=(0, -1, 0)) * Cylinder(1.5, 39, mode=Mode.PRIVATE)
    add(fillet1_piece_2, mode=Mode.SUBTRACT)

    # Sketch7 → Boss-Extrude4 (add)
    with BuildSketch(Plane.XZ.offset(-40).offset(BOSS_EXTRUDE4_START)):
        with Locations(Location((0, 30, 0), (0, 0, 270))):
            Circle(SKETCH7_R)
        with Locations(Location((0, 0, 0), (0, 0, 270))):
            Circle(SKETCH7_R)
        with Locations(Location((70, 0, 0), (0, 0, 270))):
            Circle(SKETCH7_R)
        with Locations(Location((70, 30, 0), (0, 0, 270))):
            Circle(SKETCH7_R)
    extrude(amount=-BOSS_EXTRUDE4_DEPTH)

    # Mirror2: part across plane


with BuildPart() as part_2:
    add(part_1.part)
    add(part_1.part.mirror(Plane.ZY.offset(-35)))


solid = part_2.part
